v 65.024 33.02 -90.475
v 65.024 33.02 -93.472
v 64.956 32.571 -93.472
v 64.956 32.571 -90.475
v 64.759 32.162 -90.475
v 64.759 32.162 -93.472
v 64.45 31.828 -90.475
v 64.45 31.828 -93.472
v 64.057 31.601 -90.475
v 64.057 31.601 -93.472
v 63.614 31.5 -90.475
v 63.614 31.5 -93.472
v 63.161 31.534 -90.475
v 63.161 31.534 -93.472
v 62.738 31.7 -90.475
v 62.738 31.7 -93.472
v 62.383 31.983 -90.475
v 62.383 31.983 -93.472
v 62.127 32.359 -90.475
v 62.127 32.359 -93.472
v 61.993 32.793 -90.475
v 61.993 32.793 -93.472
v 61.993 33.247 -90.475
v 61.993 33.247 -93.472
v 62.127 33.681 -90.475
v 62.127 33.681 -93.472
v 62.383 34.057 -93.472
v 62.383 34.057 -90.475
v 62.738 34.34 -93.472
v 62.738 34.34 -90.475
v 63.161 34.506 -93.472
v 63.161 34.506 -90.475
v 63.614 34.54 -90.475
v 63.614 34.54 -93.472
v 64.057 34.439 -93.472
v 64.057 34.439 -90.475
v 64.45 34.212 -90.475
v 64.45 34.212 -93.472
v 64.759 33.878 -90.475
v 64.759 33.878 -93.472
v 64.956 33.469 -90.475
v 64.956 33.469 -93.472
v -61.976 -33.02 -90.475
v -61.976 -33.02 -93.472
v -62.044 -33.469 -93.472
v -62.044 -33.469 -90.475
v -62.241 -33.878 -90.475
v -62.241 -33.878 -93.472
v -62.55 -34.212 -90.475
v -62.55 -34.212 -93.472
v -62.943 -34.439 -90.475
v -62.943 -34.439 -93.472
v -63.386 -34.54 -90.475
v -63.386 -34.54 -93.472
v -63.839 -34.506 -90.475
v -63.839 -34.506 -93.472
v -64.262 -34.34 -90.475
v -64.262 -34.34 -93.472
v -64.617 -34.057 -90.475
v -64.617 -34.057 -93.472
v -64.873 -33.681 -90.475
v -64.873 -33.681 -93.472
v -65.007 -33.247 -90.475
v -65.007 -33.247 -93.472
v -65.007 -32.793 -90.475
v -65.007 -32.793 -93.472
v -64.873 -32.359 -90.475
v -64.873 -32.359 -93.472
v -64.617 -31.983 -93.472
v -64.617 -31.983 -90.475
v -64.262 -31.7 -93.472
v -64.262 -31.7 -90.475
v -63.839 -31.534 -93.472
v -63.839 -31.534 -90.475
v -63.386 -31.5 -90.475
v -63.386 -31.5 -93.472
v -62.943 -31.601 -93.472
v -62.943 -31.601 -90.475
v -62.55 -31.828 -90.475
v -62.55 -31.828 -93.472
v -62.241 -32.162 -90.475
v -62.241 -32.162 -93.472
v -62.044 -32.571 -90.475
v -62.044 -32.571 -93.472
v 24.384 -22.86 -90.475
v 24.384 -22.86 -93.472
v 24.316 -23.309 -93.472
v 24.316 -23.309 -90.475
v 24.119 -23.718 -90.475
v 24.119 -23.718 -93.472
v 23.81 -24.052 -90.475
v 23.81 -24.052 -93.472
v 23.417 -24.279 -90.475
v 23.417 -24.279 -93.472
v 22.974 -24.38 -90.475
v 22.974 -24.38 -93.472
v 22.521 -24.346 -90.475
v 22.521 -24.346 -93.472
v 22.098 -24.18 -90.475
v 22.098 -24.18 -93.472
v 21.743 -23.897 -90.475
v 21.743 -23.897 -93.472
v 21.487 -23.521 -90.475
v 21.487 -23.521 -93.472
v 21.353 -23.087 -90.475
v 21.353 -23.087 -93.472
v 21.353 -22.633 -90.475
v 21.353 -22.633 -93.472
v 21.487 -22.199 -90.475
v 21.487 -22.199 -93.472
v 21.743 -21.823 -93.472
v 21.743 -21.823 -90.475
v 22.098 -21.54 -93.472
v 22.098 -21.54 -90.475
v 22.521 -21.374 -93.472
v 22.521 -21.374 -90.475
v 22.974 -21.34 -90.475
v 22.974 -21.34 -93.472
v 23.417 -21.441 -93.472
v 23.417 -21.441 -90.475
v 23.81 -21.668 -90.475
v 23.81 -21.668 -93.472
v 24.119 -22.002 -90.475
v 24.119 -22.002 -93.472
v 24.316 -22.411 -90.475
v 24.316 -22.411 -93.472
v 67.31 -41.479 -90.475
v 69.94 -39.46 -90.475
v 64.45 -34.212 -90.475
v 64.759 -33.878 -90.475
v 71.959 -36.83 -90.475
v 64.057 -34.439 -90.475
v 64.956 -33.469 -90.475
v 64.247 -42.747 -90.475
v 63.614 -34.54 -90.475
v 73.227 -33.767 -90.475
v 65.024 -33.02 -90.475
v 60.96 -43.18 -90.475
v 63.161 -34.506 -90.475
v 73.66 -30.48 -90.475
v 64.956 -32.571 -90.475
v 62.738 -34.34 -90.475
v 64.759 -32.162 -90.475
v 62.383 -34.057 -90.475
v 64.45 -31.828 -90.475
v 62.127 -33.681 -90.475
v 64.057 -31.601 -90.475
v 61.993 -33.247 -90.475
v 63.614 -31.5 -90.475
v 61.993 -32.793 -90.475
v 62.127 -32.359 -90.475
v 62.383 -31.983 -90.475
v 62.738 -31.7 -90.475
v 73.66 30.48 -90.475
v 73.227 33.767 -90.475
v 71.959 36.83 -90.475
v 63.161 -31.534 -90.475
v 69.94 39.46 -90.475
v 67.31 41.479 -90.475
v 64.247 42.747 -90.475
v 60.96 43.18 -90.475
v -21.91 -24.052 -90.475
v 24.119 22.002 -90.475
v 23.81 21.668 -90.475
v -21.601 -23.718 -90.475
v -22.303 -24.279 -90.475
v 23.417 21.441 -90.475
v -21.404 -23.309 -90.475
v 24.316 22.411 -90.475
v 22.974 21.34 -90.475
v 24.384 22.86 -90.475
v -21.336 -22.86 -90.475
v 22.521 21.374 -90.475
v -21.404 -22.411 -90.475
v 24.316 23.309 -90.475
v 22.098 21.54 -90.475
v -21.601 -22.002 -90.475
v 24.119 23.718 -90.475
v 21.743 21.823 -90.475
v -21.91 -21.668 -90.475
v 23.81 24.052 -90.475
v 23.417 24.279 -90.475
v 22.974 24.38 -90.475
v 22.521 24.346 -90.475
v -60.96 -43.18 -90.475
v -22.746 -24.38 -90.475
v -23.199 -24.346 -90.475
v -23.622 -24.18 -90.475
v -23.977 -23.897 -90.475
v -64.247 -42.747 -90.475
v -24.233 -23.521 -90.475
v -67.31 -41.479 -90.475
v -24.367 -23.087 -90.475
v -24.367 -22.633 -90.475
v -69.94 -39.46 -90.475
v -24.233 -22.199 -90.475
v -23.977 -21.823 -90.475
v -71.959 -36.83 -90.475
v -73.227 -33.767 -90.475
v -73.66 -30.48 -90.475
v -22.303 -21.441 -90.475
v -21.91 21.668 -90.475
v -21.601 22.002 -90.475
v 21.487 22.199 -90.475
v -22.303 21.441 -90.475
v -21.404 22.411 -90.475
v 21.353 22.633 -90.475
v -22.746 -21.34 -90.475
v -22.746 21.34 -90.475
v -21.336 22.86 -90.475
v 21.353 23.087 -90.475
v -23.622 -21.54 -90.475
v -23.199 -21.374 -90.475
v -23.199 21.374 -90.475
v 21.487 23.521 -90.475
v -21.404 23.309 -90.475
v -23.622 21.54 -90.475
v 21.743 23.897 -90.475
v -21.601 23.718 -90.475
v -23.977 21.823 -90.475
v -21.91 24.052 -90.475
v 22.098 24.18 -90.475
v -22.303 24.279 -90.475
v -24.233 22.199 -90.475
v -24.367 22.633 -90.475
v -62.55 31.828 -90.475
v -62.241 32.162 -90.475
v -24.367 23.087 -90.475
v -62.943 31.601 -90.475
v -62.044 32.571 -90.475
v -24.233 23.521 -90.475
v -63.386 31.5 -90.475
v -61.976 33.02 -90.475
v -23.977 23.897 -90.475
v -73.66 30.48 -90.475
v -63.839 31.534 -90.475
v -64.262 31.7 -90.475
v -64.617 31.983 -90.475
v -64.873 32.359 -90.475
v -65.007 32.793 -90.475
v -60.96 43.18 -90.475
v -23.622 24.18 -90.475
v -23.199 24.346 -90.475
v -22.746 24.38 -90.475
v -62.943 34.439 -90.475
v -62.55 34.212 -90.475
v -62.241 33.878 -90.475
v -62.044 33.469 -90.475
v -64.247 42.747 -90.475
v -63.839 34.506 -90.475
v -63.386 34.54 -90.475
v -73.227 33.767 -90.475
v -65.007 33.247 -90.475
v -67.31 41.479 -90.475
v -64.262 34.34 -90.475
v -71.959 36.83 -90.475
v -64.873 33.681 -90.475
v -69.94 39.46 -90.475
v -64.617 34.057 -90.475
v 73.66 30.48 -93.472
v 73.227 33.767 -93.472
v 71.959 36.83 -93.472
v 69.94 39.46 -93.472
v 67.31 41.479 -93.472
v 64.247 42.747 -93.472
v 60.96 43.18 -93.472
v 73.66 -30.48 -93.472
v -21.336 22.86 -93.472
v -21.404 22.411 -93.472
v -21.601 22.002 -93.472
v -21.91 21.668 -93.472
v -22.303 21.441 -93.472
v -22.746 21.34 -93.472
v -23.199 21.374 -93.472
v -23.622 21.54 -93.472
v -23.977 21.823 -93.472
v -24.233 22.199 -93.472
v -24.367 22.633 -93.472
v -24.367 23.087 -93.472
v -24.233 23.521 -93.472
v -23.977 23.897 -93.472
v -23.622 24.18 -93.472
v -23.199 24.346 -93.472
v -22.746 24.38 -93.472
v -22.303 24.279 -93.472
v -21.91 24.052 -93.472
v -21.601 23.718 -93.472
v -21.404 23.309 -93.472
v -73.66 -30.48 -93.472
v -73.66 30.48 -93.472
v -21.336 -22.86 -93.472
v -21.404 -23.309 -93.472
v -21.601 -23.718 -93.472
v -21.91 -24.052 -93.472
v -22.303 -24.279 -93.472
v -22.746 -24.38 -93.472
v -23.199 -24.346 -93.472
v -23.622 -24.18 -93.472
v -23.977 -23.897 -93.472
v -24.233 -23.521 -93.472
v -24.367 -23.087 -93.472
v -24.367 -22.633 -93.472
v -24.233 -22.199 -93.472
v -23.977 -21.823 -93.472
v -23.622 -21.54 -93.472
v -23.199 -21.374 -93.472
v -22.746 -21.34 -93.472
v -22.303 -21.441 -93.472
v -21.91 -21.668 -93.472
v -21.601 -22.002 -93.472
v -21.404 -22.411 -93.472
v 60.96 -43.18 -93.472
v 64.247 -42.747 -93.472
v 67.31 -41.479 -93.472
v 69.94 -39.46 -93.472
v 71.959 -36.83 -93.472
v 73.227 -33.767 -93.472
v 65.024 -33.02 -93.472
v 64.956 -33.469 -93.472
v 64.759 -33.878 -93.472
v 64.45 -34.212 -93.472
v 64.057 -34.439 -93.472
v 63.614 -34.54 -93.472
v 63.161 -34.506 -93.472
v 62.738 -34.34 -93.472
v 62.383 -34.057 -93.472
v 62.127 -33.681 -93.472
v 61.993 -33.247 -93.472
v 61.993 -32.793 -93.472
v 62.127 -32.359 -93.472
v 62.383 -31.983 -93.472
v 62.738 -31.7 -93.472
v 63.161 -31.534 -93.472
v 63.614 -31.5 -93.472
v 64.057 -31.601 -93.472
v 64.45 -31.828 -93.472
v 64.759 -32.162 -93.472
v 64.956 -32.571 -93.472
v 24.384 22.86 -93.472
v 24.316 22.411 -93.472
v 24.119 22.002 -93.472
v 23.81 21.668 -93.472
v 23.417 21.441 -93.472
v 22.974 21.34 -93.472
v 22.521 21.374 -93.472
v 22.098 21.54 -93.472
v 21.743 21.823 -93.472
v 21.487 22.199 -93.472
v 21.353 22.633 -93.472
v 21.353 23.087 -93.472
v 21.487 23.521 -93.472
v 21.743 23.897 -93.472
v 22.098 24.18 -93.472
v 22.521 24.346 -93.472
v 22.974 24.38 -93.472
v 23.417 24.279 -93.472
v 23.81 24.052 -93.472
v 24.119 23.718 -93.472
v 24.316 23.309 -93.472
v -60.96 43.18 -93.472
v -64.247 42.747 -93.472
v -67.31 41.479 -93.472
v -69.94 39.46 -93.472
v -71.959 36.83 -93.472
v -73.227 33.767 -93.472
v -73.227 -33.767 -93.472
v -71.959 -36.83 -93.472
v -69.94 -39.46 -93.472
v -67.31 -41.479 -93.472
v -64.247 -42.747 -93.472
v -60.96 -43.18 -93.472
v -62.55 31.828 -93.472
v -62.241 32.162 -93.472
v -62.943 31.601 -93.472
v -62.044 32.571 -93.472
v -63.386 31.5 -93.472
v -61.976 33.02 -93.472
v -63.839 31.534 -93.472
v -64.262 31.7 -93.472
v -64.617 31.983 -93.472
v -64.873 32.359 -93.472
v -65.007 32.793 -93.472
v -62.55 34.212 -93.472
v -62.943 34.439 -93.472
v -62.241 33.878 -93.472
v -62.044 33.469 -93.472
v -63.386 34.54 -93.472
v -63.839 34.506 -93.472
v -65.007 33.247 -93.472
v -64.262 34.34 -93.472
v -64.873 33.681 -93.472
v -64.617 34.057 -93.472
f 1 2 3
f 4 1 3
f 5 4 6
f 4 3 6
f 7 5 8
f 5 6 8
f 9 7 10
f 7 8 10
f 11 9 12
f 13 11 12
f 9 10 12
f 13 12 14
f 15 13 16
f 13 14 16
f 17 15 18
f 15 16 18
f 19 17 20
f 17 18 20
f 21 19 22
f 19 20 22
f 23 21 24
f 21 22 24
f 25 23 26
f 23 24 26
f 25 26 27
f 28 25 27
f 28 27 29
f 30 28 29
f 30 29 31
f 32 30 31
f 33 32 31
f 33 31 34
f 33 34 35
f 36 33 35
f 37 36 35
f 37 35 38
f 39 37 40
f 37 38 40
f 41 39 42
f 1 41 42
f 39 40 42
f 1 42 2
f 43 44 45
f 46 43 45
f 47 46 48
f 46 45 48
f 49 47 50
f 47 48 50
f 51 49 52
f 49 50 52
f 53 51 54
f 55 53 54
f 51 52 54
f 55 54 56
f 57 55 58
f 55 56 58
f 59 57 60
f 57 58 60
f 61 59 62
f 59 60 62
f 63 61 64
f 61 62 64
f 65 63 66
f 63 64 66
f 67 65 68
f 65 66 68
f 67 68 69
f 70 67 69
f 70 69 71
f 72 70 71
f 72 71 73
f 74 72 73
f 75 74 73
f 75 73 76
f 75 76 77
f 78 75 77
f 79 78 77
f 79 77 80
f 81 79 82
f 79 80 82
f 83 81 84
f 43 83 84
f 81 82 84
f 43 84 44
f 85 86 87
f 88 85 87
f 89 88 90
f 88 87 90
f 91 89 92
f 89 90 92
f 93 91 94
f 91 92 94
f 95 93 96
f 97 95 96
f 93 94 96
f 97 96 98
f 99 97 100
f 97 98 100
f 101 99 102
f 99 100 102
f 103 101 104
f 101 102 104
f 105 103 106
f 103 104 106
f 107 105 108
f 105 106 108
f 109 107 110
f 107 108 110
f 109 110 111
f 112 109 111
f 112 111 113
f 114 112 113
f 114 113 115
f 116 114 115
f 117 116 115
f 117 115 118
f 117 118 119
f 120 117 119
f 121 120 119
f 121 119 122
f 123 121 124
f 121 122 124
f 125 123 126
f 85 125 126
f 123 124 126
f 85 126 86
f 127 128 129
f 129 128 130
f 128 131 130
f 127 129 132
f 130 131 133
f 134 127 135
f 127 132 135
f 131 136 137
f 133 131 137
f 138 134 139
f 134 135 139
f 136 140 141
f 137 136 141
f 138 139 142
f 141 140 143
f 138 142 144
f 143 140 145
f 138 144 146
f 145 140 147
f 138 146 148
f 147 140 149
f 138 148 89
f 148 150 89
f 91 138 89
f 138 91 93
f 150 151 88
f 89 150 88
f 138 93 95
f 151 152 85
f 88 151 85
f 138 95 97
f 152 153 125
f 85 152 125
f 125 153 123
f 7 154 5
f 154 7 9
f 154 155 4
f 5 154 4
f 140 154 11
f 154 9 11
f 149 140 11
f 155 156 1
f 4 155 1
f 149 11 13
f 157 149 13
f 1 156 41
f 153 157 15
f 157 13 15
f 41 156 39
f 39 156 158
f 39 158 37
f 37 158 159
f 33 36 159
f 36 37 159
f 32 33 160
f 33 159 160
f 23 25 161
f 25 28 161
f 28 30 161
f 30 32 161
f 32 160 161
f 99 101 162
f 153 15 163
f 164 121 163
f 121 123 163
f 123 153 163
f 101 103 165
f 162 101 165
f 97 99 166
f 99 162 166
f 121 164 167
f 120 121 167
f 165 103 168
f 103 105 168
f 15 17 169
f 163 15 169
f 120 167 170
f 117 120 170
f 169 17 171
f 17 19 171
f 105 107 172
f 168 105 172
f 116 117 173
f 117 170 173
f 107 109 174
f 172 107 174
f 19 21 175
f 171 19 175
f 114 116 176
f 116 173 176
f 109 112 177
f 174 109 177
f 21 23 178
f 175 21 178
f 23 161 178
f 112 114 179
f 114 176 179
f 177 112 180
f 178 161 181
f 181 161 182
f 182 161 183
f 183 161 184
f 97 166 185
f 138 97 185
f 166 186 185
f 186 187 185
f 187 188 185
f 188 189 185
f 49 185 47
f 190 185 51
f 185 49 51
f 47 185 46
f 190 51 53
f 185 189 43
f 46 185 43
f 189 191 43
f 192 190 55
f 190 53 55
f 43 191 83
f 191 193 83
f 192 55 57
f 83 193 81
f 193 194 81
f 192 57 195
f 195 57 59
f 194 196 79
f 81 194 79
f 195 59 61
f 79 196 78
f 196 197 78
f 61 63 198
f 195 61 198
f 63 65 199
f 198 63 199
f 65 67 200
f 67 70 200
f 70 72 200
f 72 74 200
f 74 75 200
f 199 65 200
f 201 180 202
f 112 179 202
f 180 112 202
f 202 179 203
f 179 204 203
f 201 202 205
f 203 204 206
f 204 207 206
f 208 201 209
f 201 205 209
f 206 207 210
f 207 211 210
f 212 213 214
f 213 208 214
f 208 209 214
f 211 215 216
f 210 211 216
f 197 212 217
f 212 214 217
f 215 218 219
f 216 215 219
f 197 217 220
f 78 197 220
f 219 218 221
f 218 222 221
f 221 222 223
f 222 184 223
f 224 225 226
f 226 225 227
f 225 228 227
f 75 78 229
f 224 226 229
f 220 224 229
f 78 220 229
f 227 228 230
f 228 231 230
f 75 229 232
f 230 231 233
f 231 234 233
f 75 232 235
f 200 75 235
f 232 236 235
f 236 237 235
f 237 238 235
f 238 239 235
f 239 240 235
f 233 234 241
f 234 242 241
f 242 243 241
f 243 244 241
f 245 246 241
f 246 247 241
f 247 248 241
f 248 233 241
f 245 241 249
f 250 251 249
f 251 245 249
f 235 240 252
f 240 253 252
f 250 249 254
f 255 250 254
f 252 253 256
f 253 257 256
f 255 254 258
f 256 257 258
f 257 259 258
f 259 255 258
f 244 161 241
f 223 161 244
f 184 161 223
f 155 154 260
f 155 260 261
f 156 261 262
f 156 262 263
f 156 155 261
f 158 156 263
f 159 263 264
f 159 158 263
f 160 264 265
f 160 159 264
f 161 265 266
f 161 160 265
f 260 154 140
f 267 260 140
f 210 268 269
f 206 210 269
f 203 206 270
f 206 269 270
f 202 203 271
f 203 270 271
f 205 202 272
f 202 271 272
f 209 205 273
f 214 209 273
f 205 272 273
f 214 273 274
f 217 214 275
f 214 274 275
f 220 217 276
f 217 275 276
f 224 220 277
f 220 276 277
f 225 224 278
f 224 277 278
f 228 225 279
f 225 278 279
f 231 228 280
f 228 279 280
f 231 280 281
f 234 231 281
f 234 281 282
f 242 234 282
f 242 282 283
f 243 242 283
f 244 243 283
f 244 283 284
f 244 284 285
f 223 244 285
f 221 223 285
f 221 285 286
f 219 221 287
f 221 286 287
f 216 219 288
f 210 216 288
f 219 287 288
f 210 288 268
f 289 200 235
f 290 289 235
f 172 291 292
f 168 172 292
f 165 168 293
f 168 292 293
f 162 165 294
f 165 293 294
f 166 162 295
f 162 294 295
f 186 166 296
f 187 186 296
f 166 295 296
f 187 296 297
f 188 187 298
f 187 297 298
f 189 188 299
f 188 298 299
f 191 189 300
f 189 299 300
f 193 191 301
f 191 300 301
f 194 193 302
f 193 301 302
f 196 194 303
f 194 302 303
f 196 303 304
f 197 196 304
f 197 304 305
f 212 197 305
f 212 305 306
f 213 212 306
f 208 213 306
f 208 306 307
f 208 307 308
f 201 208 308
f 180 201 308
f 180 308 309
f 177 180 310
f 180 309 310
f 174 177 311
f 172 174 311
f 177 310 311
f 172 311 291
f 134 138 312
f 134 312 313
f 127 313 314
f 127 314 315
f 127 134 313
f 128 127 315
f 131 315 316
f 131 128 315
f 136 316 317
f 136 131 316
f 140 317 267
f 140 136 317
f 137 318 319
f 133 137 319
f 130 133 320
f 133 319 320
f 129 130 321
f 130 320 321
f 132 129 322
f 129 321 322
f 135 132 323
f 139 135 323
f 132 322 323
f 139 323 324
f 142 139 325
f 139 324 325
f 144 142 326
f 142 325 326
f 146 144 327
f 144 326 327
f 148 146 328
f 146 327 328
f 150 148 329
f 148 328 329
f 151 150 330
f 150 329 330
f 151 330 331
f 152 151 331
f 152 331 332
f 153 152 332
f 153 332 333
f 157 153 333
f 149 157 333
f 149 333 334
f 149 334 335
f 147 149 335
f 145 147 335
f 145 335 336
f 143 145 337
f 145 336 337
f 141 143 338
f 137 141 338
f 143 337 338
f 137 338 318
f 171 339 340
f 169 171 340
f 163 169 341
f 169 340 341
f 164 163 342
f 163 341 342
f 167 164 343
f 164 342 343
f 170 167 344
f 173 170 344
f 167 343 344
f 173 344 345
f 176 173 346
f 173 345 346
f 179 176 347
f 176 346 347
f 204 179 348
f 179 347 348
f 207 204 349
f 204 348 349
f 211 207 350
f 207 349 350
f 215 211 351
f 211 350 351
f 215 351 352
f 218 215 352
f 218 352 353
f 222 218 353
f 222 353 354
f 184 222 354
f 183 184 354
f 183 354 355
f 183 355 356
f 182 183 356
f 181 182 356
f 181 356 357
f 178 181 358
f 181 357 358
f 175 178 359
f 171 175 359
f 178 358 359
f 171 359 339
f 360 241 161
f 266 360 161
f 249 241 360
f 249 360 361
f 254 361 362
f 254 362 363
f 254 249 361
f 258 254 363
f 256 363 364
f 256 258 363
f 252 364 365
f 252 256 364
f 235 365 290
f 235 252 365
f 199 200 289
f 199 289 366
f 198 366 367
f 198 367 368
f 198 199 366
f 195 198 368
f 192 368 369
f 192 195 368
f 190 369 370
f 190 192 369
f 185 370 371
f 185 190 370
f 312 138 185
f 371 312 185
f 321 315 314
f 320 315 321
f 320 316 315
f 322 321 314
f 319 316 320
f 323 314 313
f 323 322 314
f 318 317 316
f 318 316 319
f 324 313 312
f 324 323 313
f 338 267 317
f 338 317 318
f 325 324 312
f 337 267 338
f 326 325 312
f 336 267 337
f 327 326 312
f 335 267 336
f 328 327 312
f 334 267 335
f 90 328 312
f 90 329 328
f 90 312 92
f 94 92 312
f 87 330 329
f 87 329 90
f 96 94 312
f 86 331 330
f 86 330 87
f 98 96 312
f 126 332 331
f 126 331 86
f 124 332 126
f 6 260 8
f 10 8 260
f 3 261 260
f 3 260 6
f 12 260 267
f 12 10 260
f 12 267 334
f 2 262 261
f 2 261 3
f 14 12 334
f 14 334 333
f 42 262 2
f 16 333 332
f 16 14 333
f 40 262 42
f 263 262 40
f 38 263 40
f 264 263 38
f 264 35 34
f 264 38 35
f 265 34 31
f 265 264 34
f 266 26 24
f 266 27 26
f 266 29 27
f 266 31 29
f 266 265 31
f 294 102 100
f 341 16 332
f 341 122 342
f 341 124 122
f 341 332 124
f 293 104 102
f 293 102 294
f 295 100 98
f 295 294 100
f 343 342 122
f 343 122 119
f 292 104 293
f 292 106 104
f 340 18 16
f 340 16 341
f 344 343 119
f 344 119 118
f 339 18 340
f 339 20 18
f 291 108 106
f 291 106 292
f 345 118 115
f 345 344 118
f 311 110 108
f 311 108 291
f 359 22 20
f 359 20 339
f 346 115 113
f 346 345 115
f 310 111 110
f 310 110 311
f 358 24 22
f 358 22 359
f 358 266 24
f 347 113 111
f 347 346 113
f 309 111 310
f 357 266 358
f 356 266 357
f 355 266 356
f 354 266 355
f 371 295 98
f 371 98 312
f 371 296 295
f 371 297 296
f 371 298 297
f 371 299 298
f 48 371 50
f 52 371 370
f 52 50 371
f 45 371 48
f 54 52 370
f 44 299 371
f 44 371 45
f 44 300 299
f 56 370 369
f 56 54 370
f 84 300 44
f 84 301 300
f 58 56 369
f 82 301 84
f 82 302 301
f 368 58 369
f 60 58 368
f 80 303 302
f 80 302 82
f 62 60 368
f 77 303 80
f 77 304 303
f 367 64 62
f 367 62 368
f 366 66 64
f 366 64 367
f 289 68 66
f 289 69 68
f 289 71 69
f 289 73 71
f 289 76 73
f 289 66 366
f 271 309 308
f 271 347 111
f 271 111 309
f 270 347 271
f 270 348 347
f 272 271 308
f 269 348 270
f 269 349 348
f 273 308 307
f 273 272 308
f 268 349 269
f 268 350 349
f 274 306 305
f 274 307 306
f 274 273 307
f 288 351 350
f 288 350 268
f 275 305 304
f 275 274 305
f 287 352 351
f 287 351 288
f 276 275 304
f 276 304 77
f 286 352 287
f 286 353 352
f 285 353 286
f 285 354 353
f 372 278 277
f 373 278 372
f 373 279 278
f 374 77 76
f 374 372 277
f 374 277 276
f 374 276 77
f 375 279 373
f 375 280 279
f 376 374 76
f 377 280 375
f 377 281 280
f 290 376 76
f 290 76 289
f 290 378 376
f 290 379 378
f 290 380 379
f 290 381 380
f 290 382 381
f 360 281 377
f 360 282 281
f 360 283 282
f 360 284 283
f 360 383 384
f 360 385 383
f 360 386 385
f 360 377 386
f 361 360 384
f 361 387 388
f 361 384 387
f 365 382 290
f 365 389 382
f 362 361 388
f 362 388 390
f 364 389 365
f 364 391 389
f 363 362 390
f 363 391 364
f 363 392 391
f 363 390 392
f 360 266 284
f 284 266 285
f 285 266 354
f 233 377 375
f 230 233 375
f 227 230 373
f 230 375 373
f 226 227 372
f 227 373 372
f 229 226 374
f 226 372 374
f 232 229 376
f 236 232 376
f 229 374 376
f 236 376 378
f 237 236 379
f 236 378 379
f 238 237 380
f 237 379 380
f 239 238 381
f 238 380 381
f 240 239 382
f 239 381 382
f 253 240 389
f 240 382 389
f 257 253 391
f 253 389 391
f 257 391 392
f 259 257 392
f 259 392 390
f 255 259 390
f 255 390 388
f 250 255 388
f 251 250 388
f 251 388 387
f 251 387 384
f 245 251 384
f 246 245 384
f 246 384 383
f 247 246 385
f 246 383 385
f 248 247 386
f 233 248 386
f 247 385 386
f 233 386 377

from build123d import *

# Parameters (mm, degrees)
PAD015_DEPTH    = 2.9972
SKETCH022_R     = 1.524
POCKET002_DEPTH = 2.9972
SKETCH023_R     = 1.524
POCKET003_DEPTH = 2.9972


with BuildPart() as part:
    # Sketch018 → Pad015 (new body)
    with BuildSketch(Plane.XY.offset(-90.4748)):
        with BuildLine():
            Line((-60.96, 43.18), (60.96, 43.18))
            ThreePointArc((73.66, 30.48), (69.940256, 39.460256), (60.96, 43.18))
            Line((73.66, 30.48), (73.66, -30.48))
            ThreePointArc((60.96, -43.18), (69.940256, -39.460256), (73.66, -30.48))
            Line((60.96, -43.18), (-60.96, -43.18))
            ThreePointArc((-73.66, -30.48), (-69.940256, -39.460256), (-60.96, -43.18))
            Line((-73.66, -30.48), (-73.66, 30.48))
            ThreePointArc((-60.96, 43.18), (-69.940256, 39.460256), (-73.66, 30.48))
        make_face()
    extrude(amount=-PAD015_DEPTH)

    # Sketch022 → Pocket002 (cut)
    with BuildSketch(Plane(origin=(0, 0, -93.472), x_dir=(1, 0, 0), z_dir=(0, 0, -1))):
        with Locations((-63.5, 33.02)):
            Circle(SKETCH022_R)
        with Locations((-63.5, -33.02)):
            Circle(SKETCH022_R)
        with Locations((63.5, -33.02)):
            Circle(SKETCH022_R)
        with Locations((63.5, 33.02)):
            Circle(SKETCH022_R)
    extrude(amount=-POCKET002_DEPTH, mode=Mode.SUBTRACT)

    # Sketch023 → Pocket003 (cut)
    with BuildSketch(Plane(origin=(0, 0, -93.472), x_dir=(1, 0, 0), z_dir=(0, 0, -1))):
        with Locations((-22.86, 22.86)):
            Circle(SKETCH023_R)
        with Locations((-22.86, -22.86)):
            Circle(SKETCH023_R)
        with Locations((22.86, -22.86)):
            Circle(SKETCH023_R)
        with Locations((22.86, 22.86)):
            Circle(SKETCH023_R)
    extrude(amount=-POCKET003_DEPTH, mode=Mode.SUBTRACT)


solid = part.part
